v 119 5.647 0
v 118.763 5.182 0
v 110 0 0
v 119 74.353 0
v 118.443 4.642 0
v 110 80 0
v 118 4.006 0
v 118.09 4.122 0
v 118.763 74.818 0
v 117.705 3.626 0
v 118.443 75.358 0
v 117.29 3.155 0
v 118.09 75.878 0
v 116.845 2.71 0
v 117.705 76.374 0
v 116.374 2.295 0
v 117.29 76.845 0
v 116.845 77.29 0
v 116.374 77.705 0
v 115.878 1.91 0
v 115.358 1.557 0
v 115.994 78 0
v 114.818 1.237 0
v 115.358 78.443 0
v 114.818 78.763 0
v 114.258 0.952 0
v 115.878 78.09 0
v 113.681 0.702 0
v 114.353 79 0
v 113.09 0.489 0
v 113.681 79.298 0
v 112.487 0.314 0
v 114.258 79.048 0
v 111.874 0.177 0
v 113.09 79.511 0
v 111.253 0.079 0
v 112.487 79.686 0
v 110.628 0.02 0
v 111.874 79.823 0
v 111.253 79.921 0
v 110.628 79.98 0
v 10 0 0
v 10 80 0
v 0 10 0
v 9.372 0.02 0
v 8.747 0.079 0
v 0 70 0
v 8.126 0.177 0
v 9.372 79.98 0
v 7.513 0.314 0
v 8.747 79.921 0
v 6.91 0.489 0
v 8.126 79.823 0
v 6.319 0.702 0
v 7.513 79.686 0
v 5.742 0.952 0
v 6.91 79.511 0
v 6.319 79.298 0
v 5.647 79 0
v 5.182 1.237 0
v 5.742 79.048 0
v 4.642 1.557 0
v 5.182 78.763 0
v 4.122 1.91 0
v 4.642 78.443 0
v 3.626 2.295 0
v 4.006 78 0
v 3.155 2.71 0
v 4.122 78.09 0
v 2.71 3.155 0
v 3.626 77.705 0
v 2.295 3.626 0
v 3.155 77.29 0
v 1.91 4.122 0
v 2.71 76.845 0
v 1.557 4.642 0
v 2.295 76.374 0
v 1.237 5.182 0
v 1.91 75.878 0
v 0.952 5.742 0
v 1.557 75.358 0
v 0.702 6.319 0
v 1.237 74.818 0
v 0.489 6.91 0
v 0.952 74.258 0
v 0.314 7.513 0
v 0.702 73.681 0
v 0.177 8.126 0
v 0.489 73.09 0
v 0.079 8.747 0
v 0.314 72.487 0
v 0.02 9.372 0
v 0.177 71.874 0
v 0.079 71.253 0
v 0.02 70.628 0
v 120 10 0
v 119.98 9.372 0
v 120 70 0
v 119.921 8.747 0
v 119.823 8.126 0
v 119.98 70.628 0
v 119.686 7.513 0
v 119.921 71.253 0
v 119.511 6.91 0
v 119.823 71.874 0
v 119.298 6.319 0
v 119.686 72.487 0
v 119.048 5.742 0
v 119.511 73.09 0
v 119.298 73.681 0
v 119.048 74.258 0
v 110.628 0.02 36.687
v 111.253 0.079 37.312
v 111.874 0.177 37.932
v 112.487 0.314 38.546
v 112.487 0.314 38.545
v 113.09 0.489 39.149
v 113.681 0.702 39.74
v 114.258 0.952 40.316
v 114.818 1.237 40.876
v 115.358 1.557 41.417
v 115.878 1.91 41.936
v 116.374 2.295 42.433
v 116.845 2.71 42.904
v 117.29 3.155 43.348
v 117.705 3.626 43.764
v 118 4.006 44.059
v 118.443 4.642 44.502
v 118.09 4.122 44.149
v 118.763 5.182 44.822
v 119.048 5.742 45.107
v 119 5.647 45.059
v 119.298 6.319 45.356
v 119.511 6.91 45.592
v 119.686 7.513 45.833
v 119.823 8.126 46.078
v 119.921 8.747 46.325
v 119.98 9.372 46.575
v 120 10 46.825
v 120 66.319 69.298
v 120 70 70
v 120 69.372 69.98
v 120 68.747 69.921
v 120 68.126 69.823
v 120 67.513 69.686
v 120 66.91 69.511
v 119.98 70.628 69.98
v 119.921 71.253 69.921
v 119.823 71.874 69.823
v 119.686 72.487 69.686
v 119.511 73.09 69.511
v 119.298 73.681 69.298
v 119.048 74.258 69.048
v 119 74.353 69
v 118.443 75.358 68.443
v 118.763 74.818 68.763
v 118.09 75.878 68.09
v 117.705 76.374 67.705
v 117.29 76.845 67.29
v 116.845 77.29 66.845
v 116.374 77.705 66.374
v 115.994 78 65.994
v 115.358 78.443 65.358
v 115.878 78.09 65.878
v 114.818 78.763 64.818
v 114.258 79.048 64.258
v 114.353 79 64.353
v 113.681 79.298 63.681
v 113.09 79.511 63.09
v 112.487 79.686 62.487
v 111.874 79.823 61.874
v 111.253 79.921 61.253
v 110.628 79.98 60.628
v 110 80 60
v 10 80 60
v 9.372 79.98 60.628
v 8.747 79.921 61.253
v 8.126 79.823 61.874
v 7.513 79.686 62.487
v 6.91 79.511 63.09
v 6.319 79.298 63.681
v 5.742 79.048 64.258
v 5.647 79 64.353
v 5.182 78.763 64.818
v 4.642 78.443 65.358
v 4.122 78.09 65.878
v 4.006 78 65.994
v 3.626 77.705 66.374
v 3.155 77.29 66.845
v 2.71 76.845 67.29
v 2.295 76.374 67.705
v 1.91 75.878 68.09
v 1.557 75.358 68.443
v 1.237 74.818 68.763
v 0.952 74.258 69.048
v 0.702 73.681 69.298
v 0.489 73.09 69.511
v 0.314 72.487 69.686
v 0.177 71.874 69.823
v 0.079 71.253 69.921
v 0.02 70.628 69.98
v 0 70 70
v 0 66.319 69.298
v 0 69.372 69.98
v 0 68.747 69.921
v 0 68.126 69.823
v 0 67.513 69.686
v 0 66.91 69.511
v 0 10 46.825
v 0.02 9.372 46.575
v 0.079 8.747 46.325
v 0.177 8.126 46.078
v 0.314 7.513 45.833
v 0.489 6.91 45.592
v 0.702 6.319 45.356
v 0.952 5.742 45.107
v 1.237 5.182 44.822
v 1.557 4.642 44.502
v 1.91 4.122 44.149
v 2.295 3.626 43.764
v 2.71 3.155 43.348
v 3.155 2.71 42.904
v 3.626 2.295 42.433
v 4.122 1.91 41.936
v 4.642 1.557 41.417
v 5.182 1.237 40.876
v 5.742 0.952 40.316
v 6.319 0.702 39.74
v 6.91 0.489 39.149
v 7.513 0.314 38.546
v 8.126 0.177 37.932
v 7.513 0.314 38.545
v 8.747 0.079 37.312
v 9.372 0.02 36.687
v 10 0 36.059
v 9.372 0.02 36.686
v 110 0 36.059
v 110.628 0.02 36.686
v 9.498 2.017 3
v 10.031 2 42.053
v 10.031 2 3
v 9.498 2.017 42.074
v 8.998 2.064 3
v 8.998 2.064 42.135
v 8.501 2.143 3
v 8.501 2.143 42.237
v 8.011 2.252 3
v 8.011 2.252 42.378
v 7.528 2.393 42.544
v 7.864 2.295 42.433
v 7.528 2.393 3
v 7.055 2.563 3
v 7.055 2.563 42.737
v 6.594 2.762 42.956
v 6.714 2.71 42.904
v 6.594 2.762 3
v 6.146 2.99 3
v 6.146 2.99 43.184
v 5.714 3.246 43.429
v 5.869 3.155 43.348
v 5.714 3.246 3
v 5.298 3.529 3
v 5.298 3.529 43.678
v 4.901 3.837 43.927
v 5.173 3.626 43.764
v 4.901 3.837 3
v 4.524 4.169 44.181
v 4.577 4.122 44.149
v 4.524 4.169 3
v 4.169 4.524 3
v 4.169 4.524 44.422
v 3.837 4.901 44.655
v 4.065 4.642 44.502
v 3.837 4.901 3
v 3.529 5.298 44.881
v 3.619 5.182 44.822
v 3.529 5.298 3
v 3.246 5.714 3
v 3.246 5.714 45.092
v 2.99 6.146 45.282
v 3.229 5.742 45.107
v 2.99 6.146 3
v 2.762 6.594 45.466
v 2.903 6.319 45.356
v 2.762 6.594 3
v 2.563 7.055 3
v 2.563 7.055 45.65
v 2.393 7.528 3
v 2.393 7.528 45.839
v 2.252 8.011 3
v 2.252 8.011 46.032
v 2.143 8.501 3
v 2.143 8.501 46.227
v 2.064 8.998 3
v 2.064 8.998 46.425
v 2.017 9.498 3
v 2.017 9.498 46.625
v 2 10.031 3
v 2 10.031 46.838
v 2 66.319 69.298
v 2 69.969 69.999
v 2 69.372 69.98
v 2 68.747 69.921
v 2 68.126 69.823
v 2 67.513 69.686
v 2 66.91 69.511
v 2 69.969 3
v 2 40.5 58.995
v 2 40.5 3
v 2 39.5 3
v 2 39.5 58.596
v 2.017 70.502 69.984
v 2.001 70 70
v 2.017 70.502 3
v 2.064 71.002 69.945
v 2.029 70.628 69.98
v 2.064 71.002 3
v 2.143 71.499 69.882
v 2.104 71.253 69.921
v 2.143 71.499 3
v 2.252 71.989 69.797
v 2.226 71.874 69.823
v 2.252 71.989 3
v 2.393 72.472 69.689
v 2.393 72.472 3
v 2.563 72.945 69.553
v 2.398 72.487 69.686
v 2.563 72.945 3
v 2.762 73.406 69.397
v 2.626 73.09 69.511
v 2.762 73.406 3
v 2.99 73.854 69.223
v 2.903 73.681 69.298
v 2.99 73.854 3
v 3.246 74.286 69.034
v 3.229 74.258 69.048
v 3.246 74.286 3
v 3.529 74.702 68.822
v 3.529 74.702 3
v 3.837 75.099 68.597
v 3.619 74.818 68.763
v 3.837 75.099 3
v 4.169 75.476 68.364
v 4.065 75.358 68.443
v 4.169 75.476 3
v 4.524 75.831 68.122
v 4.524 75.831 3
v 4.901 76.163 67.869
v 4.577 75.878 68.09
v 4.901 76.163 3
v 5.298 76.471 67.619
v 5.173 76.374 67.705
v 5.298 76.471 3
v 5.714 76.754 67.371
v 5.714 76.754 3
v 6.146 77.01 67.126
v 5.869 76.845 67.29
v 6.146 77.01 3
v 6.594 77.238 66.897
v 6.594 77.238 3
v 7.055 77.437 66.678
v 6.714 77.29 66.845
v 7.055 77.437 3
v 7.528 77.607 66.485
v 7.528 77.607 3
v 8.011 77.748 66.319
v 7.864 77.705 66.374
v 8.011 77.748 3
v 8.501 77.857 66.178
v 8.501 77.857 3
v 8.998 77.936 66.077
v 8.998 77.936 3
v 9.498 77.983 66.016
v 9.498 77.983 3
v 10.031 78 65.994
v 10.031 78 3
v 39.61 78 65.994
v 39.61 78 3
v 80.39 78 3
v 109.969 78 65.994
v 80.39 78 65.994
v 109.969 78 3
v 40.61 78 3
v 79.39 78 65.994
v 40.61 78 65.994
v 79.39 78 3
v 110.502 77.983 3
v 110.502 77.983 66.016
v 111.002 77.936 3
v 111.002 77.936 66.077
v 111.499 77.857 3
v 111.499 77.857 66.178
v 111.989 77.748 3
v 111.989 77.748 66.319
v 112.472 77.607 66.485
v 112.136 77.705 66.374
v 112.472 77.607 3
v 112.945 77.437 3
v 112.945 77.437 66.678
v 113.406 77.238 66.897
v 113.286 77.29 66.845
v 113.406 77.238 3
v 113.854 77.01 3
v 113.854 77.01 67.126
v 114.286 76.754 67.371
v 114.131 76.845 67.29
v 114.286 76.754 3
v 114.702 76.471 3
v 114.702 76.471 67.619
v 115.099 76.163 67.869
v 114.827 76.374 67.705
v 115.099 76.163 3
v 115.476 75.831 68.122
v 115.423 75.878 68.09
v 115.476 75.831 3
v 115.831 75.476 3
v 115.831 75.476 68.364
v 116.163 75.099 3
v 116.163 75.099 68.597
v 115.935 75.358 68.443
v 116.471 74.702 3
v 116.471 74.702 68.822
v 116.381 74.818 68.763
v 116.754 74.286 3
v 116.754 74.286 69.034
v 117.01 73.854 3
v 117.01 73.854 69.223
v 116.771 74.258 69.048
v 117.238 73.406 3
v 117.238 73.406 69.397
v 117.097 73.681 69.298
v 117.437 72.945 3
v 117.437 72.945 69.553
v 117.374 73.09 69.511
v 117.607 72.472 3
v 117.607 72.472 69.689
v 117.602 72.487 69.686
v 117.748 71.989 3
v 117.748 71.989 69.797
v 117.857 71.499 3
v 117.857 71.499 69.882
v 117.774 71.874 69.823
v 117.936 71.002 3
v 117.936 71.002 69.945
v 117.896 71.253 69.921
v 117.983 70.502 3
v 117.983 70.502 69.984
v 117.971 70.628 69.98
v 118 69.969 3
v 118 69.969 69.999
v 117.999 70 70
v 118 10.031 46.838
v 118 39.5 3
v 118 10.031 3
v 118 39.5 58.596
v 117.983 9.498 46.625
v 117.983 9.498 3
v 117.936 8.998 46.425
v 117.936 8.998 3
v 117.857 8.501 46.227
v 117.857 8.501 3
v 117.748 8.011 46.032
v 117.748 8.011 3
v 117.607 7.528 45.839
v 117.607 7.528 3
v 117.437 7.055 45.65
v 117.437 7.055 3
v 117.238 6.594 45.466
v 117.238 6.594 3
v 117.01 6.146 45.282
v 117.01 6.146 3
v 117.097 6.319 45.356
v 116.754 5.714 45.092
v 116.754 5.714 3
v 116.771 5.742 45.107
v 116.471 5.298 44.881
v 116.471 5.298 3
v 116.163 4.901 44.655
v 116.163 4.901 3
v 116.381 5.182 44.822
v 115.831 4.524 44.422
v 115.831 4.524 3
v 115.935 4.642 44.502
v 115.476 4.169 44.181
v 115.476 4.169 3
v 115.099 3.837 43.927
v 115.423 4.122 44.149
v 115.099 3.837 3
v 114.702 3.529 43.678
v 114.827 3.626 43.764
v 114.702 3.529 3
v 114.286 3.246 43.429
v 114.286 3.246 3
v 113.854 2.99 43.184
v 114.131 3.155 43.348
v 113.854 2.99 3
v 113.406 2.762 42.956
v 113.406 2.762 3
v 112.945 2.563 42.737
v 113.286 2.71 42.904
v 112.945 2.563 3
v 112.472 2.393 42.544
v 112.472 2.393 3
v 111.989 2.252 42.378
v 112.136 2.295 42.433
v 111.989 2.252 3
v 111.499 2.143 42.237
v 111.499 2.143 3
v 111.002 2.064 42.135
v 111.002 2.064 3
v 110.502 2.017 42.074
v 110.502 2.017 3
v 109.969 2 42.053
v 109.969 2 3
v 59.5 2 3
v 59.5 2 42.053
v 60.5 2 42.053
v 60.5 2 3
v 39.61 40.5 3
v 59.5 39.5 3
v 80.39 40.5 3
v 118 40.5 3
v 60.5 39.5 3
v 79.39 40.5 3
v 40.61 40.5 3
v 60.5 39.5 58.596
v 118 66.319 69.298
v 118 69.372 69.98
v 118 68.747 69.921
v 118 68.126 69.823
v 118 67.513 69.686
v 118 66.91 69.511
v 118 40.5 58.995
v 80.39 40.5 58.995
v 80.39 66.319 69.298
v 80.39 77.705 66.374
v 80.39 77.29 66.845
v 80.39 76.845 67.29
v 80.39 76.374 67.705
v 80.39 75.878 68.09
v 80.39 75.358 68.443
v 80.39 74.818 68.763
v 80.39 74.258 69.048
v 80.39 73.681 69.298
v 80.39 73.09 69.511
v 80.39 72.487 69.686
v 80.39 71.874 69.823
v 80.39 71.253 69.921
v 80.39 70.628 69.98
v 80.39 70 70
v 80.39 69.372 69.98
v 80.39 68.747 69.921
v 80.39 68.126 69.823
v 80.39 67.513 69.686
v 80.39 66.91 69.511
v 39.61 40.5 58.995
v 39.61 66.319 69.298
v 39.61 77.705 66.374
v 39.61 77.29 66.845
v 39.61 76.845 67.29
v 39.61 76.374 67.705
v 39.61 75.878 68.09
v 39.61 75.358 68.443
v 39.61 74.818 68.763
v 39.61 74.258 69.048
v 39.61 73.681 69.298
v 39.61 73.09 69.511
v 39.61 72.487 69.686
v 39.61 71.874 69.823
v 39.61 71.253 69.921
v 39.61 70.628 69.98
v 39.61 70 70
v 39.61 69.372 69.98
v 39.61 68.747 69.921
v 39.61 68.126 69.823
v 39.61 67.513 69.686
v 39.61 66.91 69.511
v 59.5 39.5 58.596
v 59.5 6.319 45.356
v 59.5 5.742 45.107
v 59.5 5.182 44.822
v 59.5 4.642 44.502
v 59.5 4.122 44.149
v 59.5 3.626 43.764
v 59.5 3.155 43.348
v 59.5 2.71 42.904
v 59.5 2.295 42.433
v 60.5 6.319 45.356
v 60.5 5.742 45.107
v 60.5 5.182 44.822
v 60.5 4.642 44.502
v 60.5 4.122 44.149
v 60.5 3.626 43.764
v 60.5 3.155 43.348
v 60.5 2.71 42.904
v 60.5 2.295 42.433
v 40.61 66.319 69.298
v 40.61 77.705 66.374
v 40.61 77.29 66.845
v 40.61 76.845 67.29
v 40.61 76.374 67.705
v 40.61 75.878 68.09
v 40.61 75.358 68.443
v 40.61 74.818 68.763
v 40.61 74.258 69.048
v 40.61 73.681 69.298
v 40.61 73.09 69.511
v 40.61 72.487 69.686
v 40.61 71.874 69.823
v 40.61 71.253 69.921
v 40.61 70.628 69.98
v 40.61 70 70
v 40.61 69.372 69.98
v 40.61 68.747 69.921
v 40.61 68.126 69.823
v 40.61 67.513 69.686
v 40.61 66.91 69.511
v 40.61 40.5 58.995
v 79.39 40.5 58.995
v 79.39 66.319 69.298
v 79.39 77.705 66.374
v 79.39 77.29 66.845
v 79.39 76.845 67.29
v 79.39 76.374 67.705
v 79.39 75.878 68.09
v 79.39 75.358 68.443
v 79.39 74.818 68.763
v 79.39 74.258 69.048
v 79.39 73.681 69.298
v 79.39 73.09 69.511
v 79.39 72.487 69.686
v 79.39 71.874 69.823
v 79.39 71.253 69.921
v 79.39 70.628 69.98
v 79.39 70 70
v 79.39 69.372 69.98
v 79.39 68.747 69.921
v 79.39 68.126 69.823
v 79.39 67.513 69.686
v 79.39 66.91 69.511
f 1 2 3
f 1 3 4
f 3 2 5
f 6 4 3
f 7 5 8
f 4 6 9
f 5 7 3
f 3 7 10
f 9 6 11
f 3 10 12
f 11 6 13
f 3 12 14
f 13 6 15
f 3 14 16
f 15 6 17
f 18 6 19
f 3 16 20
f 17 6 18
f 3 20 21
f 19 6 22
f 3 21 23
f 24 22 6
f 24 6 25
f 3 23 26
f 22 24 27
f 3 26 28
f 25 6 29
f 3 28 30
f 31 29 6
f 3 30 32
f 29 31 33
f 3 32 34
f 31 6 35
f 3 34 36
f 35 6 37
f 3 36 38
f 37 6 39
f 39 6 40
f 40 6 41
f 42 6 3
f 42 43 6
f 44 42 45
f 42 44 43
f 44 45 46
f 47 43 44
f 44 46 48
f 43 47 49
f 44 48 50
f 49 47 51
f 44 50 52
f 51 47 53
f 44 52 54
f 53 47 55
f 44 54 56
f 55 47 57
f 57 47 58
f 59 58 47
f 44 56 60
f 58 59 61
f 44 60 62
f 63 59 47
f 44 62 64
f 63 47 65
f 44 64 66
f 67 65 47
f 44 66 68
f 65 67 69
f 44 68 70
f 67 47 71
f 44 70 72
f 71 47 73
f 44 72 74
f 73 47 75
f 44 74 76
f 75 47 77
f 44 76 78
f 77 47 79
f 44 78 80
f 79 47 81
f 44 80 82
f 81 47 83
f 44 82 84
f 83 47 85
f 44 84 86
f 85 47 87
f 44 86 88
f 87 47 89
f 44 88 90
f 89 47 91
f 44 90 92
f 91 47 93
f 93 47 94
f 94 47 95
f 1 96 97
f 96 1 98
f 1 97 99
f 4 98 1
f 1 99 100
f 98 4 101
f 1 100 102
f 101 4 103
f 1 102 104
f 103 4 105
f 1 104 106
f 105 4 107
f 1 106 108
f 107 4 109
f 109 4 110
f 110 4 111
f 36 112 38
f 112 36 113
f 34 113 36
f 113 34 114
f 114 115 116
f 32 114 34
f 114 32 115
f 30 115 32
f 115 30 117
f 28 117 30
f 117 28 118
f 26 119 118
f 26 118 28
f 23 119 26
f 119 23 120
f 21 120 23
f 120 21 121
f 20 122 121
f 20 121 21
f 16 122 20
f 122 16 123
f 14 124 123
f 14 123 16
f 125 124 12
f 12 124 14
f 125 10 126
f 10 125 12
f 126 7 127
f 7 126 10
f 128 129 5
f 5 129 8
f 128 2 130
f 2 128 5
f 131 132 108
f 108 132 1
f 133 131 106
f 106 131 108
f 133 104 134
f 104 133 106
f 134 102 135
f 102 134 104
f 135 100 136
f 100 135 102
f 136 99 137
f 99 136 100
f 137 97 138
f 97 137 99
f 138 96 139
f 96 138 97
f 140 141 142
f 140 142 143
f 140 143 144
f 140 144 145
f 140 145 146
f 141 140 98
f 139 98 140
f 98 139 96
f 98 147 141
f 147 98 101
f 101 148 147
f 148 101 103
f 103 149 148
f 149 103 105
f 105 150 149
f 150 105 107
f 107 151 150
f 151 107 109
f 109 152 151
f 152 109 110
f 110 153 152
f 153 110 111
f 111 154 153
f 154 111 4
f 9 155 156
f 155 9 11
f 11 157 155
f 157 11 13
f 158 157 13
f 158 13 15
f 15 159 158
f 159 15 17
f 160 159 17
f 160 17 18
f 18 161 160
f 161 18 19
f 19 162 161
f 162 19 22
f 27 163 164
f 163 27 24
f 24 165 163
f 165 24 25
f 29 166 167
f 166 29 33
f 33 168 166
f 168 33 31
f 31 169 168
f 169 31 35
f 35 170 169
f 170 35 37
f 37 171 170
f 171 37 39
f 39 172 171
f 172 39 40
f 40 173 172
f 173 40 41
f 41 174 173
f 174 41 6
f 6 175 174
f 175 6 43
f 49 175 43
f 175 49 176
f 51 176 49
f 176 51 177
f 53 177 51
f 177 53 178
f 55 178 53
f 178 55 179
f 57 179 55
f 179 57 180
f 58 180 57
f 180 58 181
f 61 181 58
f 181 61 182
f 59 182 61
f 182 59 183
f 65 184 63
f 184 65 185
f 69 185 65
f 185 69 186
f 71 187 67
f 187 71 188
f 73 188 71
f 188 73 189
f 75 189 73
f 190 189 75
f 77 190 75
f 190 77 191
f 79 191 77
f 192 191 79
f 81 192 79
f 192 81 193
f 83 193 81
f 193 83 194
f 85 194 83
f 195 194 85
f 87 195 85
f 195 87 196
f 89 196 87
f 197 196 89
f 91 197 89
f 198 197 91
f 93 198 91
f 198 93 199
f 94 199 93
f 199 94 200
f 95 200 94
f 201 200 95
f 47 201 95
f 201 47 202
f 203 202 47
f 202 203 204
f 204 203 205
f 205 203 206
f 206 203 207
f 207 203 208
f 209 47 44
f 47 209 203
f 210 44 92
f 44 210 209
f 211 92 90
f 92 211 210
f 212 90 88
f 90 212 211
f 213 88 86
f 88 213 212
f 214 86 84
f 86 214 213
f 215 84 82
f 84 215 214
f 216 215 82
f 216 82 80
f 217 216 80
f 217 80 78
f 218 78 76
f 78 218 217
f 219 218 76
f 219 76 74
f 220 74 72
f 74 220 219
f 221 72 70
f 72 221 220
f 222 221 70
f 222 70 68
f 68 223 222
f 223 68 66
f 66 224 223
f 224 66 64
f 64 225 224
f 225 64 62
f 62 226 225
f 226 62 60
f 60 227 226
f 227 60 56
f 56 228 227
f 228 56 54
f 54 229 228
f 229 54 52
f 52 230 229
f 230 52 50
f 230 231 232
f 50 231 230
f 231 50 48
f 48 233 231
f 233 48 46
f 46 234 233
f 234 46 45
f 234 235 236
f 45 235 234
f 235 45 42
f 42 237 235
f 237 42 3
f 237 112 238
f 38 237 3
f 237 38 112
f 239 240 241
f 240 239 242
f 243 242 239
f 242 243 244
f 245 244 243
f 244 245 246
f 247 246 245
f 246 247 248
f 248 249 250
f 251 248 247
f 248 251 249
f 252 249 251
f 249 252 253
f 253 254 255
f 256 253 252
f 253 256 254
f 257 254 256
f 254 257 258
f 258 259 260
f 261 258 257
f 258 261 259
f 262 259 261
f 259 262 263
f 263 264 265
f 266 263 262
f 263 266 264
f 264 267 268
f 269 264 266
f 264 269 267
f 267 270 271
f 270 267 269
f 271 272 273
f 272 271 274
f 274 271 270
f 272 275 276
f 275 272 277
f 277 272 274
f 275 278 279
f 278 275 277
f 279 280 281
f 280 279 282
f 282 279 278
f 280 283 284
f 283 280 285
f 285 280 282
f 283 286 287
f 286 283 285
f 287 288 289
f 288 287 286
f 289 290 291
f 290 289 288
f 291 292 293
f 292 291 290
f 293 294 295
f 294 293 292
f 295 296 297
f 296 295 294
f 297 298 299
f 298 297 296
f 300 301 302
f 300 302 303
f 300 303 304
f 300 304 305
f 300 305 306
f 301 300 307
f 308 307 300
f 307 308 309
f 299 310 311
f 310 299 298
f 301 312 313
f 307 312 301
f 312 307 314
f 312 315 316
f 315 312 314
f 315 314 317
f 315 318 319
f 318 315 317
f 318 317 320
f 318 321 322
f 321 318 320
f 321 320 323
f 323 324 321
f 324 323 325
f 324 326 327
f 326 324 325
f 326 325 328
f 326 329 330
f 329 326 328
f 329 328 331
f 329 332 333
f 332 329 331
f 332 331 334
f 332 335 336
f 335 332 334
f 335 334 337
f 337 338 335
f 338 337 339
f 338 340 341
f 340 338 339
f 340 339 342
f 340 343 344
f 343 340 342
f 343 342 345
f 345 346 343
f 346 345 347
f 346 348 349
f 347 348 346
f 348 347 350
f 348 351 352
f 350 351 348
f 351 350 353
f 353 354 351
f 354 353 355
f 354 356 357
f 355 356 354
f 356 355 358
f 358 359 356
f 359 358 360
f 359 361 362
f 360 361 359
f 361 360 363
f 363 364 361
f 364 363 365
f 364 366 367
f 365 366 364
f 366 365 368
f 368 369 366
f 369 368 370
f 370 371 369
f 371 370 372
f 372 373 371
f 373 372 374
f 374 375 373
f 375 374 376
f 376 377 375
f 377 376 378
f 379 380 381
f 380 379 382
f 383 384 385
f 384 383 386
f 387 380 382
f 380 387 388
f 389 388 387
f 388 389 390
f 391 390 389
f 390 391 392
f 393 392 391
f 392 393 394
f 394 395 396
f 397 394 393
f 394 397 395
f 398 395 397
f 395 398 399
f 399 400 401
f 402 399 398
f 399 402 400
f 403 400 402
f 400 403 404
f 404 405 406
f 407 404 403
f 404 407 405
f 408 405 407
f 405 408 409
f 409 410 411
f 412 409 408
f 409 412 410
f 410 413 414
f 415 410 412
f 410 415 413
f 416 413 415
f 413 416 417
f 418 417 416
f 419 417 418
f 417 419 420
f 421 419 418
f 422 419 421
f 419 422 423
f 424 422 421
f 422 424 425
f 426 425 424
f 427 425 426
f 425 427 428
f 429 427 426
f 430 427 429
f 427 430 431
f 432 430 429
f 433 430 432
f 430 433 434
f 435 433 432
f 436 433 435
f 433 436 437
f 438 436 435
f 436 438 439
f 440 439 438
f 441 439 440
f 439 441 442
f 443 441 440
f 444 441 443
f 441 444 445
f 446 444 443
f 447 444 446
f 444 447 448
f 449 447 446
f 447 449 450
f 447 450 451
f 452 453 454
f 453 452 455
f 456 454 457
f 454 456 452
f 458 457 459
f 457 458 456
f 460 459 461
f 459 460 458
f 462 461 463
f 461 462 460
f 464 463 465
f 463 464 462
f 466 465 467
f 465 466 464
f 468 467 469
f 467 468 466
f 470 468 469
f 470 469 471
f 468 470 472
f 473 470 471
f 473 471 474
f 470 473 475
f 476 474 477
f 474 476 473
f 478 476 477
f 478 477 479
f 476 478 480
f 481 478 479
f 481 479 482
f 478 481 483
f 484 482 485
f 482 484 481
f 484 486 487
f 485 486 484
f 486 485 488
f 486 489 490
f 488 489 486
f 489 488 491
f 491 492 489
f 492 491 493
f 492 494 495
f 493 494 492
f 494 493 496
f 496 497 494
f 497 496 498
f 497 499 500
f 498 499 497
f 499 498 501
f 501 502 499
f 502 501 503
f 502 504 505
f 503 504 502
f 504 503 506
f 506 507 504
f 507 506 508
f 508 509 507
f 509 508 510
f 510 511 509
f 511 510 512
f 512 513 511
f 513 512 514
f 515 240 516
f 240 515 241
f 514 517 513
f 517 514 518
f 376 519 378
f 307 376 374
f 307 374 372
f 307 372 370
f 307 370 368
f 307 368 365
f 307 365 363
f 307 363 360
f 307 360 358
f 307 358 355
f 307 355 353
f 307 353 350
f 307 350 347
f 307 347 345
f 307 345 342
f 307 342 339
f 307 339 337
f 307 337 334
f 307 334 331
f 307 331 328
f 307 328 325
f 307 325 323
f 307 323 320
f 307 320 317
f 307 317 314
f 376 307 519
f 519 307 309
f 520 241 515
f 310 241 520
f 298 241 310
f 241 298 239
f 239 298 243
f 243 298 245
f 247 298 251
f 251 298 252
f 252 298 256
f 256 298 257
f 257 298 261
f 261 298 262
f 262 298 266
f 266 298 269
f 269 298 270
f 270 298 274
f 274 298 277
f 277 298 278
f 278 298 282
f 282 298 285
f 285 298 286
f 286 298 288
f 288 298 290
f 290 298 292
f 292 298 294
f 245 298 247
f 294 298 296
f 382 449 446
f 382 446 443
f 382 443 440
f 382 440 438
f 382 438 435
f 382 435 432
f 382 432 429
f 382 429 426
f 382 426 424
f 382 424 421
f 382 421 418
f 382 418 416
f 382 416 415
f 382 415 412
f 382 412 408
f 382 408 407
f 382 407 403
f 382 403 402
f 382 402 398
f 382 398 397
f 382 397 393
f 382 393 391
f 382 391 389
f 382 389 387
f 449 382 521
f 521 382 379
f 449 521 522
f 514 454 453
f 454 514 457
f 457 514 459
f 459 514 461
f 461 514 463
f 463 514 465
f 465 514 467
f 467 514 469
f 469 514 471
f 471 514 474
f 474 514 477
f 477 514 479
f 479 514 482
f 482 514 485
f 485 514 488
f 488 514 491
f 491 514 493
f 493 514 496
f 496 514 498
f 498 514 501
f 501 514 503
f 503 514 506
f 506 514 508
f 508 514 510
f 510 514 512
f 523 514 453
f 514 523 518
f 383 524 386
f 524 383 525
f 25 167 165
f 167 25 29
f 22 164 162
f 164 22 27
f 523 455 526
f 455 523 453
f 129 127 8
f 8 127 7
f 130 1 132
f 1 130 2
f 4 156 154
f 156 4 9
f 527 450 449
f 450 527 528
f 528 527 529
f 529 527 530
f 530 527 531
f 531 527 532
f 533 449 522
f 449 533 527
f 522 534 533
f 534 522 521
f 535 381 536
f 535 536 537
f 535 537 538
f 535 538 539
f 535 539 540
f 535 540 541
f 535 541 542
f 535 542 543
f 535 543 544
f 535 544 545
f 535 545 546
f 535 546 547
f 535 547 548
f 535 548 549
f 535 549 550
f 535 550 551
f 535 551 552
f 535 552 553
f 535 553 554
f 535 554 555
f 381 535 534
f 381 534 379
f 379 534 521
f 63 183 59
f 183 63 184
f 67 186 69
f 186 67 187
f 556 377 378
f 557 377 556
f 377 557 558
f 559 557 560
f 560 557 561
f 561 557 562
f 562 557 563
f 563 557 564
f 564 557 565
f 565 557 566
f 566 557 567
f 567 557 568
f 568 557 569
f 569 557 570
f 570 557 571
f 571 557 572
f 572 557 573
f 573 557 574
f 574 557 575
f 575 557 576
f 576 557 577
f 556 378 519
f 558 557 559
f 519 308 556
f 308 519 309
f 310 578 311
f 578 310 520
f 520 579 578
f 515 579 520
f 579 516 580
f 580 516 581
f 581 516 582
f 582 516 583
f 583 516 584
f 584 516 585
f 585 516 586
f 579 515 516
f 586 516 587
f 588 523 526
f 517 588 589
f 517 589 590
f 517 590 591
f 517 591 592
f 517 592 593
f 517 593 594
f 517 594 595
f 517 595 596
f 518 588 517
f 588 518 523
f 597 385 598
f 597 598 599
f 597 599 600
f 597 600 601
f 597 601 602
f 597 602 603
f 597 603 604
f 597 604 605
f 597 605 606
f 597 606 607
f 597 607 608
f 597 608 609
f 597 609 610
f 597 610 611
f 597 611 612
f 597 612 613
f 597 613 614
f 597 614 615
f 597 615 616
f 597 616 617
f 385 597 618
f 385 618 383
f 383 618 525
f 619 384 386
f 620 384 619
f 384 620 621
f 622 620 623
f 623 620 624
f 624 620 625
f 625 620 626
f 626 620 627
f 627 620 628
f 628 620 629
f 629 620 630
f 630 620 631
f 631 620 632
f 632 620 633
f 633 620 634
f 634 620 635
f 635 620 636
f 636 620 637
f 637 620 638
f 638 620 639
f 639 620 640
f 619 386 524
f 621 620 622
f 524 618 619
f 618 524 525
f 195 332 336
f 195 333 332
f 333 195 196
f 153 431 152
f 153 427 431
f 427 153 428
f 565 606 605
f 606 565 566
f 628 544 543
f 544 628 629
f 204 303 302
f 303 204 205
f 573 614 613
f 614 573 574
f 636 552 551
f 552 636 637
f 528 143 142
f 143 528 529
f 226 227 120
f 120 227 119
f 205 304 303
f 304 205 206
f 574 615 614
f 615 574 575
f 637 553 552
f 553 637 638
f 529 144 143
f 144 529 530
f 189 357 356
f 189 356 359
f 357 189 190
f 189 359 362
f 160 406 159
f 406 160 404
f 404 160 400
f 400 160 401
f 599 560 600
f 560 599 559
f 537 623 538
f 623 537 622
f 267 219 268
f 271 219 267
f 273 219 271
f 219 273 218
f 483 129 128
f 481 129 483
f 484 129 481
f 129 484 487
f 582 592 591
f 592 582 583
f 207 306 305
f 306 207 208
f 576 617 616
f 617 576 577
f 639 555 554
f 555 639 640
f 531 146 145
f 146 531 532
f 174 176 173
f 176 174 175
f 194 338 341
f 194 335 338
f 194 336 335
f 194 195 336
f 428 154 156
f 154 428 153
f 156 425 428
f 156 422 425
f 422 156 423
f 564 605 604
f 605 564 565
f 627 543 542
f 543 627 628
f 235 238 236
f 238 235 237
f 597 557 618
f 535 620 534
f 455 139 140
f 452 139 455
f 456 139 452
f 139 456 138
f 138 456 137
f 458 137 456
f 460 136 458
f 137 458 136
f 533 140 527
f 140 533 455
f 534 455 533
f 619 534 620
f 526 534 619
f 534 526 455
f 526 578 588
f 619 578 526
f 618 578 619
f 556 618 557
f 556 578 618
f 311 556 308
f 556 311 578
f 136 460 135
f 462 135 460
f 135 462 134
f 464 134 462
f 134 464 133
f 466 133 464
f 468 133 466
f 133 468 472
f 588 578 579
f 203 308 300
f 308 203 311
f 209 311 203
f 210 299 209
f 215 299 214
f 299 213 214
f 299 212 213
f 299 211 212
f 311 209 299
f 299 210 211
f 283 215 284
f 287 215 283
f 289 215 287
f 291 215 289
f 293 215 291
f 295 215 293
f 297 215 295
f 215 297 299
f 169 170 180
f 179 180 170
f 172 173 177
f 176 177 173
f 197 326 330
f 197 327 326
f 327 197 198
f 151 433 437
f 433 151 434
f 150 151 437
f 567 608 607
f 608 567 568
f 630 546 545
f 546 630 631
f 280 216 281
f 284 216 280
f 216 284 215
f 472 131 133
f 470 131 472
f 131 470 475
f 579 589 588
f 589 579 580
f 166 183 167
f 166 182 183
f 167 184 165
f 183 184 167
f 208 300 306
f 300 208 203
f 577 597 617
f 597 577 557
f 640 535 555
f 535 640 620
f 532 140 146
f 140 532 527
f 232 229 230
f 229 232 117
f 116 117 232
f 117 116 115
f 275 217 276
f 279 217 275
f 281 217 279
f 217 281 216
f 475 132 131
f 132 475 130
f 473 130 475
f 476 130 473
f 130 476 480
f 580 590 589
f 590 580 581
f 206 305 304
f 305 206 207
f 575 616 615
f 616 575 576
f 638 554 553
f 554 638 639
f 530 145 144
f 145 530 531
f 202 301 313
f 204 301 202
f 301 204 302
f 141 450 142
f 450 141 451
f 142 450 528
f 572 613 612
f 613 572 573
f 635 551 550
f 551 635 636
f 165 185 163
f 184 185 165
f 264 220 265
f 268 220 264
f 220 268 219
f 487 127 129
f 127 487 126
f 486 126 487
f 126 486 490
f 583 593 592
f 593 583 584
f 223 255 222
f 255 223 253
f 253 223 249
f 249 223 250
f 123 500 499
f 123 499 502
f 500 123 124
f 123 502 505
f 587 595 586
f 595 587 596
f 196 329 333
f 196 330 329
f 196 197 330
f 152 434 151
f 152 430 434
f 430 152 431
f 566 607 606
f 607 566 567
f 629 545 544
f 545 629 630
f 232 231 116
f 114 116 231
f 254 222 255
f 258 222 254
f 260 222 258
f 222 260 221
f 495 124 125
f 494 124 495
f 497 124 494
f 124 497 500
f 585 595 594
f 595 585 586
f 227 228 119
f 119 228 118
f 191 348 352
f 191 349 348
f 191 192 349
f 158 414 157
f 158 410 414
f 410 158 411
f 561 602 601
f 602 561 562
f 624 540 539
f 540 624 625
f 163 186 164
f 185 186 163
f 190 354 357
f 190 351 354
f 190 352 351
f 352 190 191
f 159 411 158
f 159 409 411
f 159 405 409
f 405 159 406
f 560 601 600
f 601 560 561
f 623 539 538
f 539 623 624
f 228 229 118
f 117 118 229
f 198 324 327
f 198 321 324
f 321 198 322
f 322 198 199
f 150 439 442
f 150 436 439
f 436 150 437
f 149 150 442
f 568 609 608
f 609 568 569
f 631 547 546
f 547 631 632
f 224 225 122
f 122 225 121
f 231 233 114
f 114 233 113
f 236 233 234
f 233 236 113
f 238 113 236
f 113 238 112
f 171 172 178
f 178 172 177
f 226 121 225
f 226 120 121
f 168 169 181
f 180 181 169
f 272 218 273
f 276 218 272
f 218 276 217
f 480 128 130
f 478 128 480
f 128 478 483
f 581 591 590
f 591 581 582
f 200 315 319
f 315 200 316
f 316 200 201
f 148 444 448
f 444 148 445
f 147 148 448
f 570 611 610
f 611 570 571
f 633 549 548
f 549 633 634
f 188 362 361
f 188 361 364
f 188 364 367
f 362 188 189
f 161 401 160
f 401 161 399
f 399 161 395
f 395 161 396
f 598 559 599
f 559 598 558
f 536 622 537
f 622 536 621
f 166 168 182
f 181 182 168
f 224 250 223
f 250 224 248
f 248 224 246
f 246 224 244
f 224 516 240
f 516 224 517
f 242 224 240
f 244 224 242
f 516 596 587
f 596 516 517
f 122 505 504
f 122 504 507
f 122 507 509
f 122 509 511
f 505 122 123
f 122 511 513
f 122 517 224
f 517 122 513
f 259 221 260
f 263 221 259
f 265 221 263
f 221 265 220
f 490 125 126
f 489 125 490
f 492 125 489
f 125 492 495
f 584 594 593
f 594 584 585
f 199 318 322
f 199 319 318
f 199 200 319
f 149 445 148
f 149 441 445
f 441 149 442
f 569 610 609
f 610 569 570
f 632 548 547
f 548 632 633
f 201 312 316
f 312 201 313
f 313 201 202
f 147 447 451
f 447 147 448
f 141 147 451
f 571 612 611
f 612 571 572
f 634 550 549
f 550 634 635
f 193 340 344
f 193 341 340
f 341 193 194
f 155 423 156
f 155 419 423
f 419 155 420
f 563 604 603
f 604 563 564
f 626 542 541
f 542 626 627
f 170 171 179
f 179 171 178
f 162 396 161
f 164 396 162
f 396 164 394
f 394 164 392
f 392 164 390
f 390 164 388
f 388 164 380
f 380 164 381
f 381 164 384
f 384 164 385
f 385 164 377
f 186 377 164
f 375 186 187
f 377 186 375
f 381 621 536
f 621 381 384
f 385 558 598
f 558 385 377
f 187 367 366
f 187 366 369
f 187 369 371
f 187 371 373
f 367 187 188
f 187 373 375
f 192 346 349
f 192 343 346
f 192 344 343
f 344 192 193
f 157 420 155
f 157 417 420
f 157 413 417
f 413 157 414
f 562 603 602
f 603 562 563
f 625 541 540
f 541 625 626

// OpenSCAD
/*
 * Customizable Box - https://www.thingiverse.com/thing:3138285
 * by ASP3D - https://www.thingiverse.com/asp3d/about
 * created 2018-10-05
 * version v1.0
 *
 * Changelog
 * --------------
 * v1.0 - 2018-10-05:
 *  - [new] Initial release
 * --------------
 * 
 * This work is licensed under the Creative Commons - Attribution - Non-Commercial ShareAlike license.
 * https://creativecommons.org/licenses/by-nc-sa/3.0/
 */


/* [Box size and params] */

width = 120;
depth = 80;
height = 70;

// Outer walls thickness
wall = 2;
// Bottom shell thickness
bottom = 3;

// Inner modules configiration
modules_select = 4; // [0:Custom (need to download source),1:Empty box,2:2x2,3:3+1,4:3+2,5:2+3+4]
// Inner modules walls thickness
modules_wall = 1;
// Custom modules (when modules_select=0 (Custom))
// Format: modules_custom = [ [[pos_x, pos_y], [size_x, size_y]], ... ];
// All sizes are in percentage
modules_custom = [
    [[0, 0], [25, 50]], [[25, 0], [50, 34]], [[75, 0], [25, 34]],
    [[0, 34], [67, 34]], [[67, 34], [33, 34]],
    [[0, 68], [25, 32]], [[50, 68], [50, 75]]
];

// Smooth corners by this value
corners_radius = 10;

// Make near side lower, use this angle for cut
top_angle = 20; // [0:45]
// Smooth top cut by this value
top_radius = 10;


/* [Hidden] */

modules_list = [

    [],
    [
        [[0, 0], [50, 50]], [[50, 0], [50, 50]],
        [[0, 50], [50, 50]], [[50, 50], [50, 50]]
    ],
    [
        [[0, 0], [100, 50]],
        [[0, 50], [33, 50]], [[33, 50], [34, 50]], [[67, 50], [33, 50]]
    ],
    [
        [[0, 0], [50, 50]], [[50, 0], [50, 50]],
        [[0, 50], [33, 50]], [[33, 50], [34, 50]], [[67, 50], [33, 50]]
    ],
    [
        [[0, 0], [25, 34]], [[25, 0], [25, 34]], [[50, 0], [25, 34]], [[75, 0], [25, 34]],
        [[0, 34], [33, 34]], [[33, 34], [34, 34]], [[67, 34], [33, 34]],
        [[0, 68], [50, 32]], [[50, 68], [50, 32]]
    ]

// [], []], [[], []], [[], []], [[], []], [[], []], [[], []], [[], []], [[], []], [[], []], [[], []], [[], []], [[], []], [[], []], [[], []], ]

];

bottom_radius = 1;

front_height = height - sin(top_angle)*height;

$fn = 100;



intersection() {
    union() {
        box_3d();
        grig_3d();
    }
    cut_3d();
}


module cut_3d() {
    translate([-1, 0, 0])
        rotate([90, 0, 90])
            linear_extrude(width + 2)
                cut_shape();
}

module cut_shape() {
    hull() {
        translate([bottom_radius, bottom_radius - bottom_radius*2, 0])
            circle(bottom_radius);
        translate([depth - bottom_radius, bottom_radius - bottom_radius*2, 0])
            circle(bottom_radius);
        translate([depth - top_radius, height - top_radius, 0])
            circle(top_radius);
        translate([top_radius, front_height - top_radius, 0])
            circle(top_radius);

    }
}


module grig_3d() {
    linear_extrude(height, convexity = 10) {
        if (modules_select == 0) {
            grid_shape(modules_custom);
        } else {
            grid_shape(modules_list[modules_select - 1]);
        }
    }
}

module grid_shape(modules) {
    w = width - wall*2 + modules_wall;
    h = depth - wall*2 + modules_wall;
    intersection() {
        translate([wall, wall, 0])
            union() {
                for (m = [0:len(modules)-1]) {
                    mx = w * modules[m][0][0]/100;
                    my = h * modules[m][0][1]/100;
                    wx = w * modules[m][1][0]/100;
                    wy = h * modules[m][1][1]/100;
                    translate([mx, my, 0])
                        difference() {
                            square([wx, wy]);
                            square([wx - modules_wall, wy - modules_wall]);
                        }
                }
            }
        bottom_shape();
    }
}
   
module box_3d() {
    linear_extrude(height, convexity = 10)
        difference() {
            bottom_shape();
            offset(delta = -wall)
                bottom_shape();        
        }
    linear_extrude(bottom)
        bottom_shape();
}
    
module bottom_shape() {
    translate([corners_radius, corners_radius, 0])
        minkowski() {
            square([width - corners_radius*2, depth - corners_radius*2]);
            circle(corners_radius);
        }
}
